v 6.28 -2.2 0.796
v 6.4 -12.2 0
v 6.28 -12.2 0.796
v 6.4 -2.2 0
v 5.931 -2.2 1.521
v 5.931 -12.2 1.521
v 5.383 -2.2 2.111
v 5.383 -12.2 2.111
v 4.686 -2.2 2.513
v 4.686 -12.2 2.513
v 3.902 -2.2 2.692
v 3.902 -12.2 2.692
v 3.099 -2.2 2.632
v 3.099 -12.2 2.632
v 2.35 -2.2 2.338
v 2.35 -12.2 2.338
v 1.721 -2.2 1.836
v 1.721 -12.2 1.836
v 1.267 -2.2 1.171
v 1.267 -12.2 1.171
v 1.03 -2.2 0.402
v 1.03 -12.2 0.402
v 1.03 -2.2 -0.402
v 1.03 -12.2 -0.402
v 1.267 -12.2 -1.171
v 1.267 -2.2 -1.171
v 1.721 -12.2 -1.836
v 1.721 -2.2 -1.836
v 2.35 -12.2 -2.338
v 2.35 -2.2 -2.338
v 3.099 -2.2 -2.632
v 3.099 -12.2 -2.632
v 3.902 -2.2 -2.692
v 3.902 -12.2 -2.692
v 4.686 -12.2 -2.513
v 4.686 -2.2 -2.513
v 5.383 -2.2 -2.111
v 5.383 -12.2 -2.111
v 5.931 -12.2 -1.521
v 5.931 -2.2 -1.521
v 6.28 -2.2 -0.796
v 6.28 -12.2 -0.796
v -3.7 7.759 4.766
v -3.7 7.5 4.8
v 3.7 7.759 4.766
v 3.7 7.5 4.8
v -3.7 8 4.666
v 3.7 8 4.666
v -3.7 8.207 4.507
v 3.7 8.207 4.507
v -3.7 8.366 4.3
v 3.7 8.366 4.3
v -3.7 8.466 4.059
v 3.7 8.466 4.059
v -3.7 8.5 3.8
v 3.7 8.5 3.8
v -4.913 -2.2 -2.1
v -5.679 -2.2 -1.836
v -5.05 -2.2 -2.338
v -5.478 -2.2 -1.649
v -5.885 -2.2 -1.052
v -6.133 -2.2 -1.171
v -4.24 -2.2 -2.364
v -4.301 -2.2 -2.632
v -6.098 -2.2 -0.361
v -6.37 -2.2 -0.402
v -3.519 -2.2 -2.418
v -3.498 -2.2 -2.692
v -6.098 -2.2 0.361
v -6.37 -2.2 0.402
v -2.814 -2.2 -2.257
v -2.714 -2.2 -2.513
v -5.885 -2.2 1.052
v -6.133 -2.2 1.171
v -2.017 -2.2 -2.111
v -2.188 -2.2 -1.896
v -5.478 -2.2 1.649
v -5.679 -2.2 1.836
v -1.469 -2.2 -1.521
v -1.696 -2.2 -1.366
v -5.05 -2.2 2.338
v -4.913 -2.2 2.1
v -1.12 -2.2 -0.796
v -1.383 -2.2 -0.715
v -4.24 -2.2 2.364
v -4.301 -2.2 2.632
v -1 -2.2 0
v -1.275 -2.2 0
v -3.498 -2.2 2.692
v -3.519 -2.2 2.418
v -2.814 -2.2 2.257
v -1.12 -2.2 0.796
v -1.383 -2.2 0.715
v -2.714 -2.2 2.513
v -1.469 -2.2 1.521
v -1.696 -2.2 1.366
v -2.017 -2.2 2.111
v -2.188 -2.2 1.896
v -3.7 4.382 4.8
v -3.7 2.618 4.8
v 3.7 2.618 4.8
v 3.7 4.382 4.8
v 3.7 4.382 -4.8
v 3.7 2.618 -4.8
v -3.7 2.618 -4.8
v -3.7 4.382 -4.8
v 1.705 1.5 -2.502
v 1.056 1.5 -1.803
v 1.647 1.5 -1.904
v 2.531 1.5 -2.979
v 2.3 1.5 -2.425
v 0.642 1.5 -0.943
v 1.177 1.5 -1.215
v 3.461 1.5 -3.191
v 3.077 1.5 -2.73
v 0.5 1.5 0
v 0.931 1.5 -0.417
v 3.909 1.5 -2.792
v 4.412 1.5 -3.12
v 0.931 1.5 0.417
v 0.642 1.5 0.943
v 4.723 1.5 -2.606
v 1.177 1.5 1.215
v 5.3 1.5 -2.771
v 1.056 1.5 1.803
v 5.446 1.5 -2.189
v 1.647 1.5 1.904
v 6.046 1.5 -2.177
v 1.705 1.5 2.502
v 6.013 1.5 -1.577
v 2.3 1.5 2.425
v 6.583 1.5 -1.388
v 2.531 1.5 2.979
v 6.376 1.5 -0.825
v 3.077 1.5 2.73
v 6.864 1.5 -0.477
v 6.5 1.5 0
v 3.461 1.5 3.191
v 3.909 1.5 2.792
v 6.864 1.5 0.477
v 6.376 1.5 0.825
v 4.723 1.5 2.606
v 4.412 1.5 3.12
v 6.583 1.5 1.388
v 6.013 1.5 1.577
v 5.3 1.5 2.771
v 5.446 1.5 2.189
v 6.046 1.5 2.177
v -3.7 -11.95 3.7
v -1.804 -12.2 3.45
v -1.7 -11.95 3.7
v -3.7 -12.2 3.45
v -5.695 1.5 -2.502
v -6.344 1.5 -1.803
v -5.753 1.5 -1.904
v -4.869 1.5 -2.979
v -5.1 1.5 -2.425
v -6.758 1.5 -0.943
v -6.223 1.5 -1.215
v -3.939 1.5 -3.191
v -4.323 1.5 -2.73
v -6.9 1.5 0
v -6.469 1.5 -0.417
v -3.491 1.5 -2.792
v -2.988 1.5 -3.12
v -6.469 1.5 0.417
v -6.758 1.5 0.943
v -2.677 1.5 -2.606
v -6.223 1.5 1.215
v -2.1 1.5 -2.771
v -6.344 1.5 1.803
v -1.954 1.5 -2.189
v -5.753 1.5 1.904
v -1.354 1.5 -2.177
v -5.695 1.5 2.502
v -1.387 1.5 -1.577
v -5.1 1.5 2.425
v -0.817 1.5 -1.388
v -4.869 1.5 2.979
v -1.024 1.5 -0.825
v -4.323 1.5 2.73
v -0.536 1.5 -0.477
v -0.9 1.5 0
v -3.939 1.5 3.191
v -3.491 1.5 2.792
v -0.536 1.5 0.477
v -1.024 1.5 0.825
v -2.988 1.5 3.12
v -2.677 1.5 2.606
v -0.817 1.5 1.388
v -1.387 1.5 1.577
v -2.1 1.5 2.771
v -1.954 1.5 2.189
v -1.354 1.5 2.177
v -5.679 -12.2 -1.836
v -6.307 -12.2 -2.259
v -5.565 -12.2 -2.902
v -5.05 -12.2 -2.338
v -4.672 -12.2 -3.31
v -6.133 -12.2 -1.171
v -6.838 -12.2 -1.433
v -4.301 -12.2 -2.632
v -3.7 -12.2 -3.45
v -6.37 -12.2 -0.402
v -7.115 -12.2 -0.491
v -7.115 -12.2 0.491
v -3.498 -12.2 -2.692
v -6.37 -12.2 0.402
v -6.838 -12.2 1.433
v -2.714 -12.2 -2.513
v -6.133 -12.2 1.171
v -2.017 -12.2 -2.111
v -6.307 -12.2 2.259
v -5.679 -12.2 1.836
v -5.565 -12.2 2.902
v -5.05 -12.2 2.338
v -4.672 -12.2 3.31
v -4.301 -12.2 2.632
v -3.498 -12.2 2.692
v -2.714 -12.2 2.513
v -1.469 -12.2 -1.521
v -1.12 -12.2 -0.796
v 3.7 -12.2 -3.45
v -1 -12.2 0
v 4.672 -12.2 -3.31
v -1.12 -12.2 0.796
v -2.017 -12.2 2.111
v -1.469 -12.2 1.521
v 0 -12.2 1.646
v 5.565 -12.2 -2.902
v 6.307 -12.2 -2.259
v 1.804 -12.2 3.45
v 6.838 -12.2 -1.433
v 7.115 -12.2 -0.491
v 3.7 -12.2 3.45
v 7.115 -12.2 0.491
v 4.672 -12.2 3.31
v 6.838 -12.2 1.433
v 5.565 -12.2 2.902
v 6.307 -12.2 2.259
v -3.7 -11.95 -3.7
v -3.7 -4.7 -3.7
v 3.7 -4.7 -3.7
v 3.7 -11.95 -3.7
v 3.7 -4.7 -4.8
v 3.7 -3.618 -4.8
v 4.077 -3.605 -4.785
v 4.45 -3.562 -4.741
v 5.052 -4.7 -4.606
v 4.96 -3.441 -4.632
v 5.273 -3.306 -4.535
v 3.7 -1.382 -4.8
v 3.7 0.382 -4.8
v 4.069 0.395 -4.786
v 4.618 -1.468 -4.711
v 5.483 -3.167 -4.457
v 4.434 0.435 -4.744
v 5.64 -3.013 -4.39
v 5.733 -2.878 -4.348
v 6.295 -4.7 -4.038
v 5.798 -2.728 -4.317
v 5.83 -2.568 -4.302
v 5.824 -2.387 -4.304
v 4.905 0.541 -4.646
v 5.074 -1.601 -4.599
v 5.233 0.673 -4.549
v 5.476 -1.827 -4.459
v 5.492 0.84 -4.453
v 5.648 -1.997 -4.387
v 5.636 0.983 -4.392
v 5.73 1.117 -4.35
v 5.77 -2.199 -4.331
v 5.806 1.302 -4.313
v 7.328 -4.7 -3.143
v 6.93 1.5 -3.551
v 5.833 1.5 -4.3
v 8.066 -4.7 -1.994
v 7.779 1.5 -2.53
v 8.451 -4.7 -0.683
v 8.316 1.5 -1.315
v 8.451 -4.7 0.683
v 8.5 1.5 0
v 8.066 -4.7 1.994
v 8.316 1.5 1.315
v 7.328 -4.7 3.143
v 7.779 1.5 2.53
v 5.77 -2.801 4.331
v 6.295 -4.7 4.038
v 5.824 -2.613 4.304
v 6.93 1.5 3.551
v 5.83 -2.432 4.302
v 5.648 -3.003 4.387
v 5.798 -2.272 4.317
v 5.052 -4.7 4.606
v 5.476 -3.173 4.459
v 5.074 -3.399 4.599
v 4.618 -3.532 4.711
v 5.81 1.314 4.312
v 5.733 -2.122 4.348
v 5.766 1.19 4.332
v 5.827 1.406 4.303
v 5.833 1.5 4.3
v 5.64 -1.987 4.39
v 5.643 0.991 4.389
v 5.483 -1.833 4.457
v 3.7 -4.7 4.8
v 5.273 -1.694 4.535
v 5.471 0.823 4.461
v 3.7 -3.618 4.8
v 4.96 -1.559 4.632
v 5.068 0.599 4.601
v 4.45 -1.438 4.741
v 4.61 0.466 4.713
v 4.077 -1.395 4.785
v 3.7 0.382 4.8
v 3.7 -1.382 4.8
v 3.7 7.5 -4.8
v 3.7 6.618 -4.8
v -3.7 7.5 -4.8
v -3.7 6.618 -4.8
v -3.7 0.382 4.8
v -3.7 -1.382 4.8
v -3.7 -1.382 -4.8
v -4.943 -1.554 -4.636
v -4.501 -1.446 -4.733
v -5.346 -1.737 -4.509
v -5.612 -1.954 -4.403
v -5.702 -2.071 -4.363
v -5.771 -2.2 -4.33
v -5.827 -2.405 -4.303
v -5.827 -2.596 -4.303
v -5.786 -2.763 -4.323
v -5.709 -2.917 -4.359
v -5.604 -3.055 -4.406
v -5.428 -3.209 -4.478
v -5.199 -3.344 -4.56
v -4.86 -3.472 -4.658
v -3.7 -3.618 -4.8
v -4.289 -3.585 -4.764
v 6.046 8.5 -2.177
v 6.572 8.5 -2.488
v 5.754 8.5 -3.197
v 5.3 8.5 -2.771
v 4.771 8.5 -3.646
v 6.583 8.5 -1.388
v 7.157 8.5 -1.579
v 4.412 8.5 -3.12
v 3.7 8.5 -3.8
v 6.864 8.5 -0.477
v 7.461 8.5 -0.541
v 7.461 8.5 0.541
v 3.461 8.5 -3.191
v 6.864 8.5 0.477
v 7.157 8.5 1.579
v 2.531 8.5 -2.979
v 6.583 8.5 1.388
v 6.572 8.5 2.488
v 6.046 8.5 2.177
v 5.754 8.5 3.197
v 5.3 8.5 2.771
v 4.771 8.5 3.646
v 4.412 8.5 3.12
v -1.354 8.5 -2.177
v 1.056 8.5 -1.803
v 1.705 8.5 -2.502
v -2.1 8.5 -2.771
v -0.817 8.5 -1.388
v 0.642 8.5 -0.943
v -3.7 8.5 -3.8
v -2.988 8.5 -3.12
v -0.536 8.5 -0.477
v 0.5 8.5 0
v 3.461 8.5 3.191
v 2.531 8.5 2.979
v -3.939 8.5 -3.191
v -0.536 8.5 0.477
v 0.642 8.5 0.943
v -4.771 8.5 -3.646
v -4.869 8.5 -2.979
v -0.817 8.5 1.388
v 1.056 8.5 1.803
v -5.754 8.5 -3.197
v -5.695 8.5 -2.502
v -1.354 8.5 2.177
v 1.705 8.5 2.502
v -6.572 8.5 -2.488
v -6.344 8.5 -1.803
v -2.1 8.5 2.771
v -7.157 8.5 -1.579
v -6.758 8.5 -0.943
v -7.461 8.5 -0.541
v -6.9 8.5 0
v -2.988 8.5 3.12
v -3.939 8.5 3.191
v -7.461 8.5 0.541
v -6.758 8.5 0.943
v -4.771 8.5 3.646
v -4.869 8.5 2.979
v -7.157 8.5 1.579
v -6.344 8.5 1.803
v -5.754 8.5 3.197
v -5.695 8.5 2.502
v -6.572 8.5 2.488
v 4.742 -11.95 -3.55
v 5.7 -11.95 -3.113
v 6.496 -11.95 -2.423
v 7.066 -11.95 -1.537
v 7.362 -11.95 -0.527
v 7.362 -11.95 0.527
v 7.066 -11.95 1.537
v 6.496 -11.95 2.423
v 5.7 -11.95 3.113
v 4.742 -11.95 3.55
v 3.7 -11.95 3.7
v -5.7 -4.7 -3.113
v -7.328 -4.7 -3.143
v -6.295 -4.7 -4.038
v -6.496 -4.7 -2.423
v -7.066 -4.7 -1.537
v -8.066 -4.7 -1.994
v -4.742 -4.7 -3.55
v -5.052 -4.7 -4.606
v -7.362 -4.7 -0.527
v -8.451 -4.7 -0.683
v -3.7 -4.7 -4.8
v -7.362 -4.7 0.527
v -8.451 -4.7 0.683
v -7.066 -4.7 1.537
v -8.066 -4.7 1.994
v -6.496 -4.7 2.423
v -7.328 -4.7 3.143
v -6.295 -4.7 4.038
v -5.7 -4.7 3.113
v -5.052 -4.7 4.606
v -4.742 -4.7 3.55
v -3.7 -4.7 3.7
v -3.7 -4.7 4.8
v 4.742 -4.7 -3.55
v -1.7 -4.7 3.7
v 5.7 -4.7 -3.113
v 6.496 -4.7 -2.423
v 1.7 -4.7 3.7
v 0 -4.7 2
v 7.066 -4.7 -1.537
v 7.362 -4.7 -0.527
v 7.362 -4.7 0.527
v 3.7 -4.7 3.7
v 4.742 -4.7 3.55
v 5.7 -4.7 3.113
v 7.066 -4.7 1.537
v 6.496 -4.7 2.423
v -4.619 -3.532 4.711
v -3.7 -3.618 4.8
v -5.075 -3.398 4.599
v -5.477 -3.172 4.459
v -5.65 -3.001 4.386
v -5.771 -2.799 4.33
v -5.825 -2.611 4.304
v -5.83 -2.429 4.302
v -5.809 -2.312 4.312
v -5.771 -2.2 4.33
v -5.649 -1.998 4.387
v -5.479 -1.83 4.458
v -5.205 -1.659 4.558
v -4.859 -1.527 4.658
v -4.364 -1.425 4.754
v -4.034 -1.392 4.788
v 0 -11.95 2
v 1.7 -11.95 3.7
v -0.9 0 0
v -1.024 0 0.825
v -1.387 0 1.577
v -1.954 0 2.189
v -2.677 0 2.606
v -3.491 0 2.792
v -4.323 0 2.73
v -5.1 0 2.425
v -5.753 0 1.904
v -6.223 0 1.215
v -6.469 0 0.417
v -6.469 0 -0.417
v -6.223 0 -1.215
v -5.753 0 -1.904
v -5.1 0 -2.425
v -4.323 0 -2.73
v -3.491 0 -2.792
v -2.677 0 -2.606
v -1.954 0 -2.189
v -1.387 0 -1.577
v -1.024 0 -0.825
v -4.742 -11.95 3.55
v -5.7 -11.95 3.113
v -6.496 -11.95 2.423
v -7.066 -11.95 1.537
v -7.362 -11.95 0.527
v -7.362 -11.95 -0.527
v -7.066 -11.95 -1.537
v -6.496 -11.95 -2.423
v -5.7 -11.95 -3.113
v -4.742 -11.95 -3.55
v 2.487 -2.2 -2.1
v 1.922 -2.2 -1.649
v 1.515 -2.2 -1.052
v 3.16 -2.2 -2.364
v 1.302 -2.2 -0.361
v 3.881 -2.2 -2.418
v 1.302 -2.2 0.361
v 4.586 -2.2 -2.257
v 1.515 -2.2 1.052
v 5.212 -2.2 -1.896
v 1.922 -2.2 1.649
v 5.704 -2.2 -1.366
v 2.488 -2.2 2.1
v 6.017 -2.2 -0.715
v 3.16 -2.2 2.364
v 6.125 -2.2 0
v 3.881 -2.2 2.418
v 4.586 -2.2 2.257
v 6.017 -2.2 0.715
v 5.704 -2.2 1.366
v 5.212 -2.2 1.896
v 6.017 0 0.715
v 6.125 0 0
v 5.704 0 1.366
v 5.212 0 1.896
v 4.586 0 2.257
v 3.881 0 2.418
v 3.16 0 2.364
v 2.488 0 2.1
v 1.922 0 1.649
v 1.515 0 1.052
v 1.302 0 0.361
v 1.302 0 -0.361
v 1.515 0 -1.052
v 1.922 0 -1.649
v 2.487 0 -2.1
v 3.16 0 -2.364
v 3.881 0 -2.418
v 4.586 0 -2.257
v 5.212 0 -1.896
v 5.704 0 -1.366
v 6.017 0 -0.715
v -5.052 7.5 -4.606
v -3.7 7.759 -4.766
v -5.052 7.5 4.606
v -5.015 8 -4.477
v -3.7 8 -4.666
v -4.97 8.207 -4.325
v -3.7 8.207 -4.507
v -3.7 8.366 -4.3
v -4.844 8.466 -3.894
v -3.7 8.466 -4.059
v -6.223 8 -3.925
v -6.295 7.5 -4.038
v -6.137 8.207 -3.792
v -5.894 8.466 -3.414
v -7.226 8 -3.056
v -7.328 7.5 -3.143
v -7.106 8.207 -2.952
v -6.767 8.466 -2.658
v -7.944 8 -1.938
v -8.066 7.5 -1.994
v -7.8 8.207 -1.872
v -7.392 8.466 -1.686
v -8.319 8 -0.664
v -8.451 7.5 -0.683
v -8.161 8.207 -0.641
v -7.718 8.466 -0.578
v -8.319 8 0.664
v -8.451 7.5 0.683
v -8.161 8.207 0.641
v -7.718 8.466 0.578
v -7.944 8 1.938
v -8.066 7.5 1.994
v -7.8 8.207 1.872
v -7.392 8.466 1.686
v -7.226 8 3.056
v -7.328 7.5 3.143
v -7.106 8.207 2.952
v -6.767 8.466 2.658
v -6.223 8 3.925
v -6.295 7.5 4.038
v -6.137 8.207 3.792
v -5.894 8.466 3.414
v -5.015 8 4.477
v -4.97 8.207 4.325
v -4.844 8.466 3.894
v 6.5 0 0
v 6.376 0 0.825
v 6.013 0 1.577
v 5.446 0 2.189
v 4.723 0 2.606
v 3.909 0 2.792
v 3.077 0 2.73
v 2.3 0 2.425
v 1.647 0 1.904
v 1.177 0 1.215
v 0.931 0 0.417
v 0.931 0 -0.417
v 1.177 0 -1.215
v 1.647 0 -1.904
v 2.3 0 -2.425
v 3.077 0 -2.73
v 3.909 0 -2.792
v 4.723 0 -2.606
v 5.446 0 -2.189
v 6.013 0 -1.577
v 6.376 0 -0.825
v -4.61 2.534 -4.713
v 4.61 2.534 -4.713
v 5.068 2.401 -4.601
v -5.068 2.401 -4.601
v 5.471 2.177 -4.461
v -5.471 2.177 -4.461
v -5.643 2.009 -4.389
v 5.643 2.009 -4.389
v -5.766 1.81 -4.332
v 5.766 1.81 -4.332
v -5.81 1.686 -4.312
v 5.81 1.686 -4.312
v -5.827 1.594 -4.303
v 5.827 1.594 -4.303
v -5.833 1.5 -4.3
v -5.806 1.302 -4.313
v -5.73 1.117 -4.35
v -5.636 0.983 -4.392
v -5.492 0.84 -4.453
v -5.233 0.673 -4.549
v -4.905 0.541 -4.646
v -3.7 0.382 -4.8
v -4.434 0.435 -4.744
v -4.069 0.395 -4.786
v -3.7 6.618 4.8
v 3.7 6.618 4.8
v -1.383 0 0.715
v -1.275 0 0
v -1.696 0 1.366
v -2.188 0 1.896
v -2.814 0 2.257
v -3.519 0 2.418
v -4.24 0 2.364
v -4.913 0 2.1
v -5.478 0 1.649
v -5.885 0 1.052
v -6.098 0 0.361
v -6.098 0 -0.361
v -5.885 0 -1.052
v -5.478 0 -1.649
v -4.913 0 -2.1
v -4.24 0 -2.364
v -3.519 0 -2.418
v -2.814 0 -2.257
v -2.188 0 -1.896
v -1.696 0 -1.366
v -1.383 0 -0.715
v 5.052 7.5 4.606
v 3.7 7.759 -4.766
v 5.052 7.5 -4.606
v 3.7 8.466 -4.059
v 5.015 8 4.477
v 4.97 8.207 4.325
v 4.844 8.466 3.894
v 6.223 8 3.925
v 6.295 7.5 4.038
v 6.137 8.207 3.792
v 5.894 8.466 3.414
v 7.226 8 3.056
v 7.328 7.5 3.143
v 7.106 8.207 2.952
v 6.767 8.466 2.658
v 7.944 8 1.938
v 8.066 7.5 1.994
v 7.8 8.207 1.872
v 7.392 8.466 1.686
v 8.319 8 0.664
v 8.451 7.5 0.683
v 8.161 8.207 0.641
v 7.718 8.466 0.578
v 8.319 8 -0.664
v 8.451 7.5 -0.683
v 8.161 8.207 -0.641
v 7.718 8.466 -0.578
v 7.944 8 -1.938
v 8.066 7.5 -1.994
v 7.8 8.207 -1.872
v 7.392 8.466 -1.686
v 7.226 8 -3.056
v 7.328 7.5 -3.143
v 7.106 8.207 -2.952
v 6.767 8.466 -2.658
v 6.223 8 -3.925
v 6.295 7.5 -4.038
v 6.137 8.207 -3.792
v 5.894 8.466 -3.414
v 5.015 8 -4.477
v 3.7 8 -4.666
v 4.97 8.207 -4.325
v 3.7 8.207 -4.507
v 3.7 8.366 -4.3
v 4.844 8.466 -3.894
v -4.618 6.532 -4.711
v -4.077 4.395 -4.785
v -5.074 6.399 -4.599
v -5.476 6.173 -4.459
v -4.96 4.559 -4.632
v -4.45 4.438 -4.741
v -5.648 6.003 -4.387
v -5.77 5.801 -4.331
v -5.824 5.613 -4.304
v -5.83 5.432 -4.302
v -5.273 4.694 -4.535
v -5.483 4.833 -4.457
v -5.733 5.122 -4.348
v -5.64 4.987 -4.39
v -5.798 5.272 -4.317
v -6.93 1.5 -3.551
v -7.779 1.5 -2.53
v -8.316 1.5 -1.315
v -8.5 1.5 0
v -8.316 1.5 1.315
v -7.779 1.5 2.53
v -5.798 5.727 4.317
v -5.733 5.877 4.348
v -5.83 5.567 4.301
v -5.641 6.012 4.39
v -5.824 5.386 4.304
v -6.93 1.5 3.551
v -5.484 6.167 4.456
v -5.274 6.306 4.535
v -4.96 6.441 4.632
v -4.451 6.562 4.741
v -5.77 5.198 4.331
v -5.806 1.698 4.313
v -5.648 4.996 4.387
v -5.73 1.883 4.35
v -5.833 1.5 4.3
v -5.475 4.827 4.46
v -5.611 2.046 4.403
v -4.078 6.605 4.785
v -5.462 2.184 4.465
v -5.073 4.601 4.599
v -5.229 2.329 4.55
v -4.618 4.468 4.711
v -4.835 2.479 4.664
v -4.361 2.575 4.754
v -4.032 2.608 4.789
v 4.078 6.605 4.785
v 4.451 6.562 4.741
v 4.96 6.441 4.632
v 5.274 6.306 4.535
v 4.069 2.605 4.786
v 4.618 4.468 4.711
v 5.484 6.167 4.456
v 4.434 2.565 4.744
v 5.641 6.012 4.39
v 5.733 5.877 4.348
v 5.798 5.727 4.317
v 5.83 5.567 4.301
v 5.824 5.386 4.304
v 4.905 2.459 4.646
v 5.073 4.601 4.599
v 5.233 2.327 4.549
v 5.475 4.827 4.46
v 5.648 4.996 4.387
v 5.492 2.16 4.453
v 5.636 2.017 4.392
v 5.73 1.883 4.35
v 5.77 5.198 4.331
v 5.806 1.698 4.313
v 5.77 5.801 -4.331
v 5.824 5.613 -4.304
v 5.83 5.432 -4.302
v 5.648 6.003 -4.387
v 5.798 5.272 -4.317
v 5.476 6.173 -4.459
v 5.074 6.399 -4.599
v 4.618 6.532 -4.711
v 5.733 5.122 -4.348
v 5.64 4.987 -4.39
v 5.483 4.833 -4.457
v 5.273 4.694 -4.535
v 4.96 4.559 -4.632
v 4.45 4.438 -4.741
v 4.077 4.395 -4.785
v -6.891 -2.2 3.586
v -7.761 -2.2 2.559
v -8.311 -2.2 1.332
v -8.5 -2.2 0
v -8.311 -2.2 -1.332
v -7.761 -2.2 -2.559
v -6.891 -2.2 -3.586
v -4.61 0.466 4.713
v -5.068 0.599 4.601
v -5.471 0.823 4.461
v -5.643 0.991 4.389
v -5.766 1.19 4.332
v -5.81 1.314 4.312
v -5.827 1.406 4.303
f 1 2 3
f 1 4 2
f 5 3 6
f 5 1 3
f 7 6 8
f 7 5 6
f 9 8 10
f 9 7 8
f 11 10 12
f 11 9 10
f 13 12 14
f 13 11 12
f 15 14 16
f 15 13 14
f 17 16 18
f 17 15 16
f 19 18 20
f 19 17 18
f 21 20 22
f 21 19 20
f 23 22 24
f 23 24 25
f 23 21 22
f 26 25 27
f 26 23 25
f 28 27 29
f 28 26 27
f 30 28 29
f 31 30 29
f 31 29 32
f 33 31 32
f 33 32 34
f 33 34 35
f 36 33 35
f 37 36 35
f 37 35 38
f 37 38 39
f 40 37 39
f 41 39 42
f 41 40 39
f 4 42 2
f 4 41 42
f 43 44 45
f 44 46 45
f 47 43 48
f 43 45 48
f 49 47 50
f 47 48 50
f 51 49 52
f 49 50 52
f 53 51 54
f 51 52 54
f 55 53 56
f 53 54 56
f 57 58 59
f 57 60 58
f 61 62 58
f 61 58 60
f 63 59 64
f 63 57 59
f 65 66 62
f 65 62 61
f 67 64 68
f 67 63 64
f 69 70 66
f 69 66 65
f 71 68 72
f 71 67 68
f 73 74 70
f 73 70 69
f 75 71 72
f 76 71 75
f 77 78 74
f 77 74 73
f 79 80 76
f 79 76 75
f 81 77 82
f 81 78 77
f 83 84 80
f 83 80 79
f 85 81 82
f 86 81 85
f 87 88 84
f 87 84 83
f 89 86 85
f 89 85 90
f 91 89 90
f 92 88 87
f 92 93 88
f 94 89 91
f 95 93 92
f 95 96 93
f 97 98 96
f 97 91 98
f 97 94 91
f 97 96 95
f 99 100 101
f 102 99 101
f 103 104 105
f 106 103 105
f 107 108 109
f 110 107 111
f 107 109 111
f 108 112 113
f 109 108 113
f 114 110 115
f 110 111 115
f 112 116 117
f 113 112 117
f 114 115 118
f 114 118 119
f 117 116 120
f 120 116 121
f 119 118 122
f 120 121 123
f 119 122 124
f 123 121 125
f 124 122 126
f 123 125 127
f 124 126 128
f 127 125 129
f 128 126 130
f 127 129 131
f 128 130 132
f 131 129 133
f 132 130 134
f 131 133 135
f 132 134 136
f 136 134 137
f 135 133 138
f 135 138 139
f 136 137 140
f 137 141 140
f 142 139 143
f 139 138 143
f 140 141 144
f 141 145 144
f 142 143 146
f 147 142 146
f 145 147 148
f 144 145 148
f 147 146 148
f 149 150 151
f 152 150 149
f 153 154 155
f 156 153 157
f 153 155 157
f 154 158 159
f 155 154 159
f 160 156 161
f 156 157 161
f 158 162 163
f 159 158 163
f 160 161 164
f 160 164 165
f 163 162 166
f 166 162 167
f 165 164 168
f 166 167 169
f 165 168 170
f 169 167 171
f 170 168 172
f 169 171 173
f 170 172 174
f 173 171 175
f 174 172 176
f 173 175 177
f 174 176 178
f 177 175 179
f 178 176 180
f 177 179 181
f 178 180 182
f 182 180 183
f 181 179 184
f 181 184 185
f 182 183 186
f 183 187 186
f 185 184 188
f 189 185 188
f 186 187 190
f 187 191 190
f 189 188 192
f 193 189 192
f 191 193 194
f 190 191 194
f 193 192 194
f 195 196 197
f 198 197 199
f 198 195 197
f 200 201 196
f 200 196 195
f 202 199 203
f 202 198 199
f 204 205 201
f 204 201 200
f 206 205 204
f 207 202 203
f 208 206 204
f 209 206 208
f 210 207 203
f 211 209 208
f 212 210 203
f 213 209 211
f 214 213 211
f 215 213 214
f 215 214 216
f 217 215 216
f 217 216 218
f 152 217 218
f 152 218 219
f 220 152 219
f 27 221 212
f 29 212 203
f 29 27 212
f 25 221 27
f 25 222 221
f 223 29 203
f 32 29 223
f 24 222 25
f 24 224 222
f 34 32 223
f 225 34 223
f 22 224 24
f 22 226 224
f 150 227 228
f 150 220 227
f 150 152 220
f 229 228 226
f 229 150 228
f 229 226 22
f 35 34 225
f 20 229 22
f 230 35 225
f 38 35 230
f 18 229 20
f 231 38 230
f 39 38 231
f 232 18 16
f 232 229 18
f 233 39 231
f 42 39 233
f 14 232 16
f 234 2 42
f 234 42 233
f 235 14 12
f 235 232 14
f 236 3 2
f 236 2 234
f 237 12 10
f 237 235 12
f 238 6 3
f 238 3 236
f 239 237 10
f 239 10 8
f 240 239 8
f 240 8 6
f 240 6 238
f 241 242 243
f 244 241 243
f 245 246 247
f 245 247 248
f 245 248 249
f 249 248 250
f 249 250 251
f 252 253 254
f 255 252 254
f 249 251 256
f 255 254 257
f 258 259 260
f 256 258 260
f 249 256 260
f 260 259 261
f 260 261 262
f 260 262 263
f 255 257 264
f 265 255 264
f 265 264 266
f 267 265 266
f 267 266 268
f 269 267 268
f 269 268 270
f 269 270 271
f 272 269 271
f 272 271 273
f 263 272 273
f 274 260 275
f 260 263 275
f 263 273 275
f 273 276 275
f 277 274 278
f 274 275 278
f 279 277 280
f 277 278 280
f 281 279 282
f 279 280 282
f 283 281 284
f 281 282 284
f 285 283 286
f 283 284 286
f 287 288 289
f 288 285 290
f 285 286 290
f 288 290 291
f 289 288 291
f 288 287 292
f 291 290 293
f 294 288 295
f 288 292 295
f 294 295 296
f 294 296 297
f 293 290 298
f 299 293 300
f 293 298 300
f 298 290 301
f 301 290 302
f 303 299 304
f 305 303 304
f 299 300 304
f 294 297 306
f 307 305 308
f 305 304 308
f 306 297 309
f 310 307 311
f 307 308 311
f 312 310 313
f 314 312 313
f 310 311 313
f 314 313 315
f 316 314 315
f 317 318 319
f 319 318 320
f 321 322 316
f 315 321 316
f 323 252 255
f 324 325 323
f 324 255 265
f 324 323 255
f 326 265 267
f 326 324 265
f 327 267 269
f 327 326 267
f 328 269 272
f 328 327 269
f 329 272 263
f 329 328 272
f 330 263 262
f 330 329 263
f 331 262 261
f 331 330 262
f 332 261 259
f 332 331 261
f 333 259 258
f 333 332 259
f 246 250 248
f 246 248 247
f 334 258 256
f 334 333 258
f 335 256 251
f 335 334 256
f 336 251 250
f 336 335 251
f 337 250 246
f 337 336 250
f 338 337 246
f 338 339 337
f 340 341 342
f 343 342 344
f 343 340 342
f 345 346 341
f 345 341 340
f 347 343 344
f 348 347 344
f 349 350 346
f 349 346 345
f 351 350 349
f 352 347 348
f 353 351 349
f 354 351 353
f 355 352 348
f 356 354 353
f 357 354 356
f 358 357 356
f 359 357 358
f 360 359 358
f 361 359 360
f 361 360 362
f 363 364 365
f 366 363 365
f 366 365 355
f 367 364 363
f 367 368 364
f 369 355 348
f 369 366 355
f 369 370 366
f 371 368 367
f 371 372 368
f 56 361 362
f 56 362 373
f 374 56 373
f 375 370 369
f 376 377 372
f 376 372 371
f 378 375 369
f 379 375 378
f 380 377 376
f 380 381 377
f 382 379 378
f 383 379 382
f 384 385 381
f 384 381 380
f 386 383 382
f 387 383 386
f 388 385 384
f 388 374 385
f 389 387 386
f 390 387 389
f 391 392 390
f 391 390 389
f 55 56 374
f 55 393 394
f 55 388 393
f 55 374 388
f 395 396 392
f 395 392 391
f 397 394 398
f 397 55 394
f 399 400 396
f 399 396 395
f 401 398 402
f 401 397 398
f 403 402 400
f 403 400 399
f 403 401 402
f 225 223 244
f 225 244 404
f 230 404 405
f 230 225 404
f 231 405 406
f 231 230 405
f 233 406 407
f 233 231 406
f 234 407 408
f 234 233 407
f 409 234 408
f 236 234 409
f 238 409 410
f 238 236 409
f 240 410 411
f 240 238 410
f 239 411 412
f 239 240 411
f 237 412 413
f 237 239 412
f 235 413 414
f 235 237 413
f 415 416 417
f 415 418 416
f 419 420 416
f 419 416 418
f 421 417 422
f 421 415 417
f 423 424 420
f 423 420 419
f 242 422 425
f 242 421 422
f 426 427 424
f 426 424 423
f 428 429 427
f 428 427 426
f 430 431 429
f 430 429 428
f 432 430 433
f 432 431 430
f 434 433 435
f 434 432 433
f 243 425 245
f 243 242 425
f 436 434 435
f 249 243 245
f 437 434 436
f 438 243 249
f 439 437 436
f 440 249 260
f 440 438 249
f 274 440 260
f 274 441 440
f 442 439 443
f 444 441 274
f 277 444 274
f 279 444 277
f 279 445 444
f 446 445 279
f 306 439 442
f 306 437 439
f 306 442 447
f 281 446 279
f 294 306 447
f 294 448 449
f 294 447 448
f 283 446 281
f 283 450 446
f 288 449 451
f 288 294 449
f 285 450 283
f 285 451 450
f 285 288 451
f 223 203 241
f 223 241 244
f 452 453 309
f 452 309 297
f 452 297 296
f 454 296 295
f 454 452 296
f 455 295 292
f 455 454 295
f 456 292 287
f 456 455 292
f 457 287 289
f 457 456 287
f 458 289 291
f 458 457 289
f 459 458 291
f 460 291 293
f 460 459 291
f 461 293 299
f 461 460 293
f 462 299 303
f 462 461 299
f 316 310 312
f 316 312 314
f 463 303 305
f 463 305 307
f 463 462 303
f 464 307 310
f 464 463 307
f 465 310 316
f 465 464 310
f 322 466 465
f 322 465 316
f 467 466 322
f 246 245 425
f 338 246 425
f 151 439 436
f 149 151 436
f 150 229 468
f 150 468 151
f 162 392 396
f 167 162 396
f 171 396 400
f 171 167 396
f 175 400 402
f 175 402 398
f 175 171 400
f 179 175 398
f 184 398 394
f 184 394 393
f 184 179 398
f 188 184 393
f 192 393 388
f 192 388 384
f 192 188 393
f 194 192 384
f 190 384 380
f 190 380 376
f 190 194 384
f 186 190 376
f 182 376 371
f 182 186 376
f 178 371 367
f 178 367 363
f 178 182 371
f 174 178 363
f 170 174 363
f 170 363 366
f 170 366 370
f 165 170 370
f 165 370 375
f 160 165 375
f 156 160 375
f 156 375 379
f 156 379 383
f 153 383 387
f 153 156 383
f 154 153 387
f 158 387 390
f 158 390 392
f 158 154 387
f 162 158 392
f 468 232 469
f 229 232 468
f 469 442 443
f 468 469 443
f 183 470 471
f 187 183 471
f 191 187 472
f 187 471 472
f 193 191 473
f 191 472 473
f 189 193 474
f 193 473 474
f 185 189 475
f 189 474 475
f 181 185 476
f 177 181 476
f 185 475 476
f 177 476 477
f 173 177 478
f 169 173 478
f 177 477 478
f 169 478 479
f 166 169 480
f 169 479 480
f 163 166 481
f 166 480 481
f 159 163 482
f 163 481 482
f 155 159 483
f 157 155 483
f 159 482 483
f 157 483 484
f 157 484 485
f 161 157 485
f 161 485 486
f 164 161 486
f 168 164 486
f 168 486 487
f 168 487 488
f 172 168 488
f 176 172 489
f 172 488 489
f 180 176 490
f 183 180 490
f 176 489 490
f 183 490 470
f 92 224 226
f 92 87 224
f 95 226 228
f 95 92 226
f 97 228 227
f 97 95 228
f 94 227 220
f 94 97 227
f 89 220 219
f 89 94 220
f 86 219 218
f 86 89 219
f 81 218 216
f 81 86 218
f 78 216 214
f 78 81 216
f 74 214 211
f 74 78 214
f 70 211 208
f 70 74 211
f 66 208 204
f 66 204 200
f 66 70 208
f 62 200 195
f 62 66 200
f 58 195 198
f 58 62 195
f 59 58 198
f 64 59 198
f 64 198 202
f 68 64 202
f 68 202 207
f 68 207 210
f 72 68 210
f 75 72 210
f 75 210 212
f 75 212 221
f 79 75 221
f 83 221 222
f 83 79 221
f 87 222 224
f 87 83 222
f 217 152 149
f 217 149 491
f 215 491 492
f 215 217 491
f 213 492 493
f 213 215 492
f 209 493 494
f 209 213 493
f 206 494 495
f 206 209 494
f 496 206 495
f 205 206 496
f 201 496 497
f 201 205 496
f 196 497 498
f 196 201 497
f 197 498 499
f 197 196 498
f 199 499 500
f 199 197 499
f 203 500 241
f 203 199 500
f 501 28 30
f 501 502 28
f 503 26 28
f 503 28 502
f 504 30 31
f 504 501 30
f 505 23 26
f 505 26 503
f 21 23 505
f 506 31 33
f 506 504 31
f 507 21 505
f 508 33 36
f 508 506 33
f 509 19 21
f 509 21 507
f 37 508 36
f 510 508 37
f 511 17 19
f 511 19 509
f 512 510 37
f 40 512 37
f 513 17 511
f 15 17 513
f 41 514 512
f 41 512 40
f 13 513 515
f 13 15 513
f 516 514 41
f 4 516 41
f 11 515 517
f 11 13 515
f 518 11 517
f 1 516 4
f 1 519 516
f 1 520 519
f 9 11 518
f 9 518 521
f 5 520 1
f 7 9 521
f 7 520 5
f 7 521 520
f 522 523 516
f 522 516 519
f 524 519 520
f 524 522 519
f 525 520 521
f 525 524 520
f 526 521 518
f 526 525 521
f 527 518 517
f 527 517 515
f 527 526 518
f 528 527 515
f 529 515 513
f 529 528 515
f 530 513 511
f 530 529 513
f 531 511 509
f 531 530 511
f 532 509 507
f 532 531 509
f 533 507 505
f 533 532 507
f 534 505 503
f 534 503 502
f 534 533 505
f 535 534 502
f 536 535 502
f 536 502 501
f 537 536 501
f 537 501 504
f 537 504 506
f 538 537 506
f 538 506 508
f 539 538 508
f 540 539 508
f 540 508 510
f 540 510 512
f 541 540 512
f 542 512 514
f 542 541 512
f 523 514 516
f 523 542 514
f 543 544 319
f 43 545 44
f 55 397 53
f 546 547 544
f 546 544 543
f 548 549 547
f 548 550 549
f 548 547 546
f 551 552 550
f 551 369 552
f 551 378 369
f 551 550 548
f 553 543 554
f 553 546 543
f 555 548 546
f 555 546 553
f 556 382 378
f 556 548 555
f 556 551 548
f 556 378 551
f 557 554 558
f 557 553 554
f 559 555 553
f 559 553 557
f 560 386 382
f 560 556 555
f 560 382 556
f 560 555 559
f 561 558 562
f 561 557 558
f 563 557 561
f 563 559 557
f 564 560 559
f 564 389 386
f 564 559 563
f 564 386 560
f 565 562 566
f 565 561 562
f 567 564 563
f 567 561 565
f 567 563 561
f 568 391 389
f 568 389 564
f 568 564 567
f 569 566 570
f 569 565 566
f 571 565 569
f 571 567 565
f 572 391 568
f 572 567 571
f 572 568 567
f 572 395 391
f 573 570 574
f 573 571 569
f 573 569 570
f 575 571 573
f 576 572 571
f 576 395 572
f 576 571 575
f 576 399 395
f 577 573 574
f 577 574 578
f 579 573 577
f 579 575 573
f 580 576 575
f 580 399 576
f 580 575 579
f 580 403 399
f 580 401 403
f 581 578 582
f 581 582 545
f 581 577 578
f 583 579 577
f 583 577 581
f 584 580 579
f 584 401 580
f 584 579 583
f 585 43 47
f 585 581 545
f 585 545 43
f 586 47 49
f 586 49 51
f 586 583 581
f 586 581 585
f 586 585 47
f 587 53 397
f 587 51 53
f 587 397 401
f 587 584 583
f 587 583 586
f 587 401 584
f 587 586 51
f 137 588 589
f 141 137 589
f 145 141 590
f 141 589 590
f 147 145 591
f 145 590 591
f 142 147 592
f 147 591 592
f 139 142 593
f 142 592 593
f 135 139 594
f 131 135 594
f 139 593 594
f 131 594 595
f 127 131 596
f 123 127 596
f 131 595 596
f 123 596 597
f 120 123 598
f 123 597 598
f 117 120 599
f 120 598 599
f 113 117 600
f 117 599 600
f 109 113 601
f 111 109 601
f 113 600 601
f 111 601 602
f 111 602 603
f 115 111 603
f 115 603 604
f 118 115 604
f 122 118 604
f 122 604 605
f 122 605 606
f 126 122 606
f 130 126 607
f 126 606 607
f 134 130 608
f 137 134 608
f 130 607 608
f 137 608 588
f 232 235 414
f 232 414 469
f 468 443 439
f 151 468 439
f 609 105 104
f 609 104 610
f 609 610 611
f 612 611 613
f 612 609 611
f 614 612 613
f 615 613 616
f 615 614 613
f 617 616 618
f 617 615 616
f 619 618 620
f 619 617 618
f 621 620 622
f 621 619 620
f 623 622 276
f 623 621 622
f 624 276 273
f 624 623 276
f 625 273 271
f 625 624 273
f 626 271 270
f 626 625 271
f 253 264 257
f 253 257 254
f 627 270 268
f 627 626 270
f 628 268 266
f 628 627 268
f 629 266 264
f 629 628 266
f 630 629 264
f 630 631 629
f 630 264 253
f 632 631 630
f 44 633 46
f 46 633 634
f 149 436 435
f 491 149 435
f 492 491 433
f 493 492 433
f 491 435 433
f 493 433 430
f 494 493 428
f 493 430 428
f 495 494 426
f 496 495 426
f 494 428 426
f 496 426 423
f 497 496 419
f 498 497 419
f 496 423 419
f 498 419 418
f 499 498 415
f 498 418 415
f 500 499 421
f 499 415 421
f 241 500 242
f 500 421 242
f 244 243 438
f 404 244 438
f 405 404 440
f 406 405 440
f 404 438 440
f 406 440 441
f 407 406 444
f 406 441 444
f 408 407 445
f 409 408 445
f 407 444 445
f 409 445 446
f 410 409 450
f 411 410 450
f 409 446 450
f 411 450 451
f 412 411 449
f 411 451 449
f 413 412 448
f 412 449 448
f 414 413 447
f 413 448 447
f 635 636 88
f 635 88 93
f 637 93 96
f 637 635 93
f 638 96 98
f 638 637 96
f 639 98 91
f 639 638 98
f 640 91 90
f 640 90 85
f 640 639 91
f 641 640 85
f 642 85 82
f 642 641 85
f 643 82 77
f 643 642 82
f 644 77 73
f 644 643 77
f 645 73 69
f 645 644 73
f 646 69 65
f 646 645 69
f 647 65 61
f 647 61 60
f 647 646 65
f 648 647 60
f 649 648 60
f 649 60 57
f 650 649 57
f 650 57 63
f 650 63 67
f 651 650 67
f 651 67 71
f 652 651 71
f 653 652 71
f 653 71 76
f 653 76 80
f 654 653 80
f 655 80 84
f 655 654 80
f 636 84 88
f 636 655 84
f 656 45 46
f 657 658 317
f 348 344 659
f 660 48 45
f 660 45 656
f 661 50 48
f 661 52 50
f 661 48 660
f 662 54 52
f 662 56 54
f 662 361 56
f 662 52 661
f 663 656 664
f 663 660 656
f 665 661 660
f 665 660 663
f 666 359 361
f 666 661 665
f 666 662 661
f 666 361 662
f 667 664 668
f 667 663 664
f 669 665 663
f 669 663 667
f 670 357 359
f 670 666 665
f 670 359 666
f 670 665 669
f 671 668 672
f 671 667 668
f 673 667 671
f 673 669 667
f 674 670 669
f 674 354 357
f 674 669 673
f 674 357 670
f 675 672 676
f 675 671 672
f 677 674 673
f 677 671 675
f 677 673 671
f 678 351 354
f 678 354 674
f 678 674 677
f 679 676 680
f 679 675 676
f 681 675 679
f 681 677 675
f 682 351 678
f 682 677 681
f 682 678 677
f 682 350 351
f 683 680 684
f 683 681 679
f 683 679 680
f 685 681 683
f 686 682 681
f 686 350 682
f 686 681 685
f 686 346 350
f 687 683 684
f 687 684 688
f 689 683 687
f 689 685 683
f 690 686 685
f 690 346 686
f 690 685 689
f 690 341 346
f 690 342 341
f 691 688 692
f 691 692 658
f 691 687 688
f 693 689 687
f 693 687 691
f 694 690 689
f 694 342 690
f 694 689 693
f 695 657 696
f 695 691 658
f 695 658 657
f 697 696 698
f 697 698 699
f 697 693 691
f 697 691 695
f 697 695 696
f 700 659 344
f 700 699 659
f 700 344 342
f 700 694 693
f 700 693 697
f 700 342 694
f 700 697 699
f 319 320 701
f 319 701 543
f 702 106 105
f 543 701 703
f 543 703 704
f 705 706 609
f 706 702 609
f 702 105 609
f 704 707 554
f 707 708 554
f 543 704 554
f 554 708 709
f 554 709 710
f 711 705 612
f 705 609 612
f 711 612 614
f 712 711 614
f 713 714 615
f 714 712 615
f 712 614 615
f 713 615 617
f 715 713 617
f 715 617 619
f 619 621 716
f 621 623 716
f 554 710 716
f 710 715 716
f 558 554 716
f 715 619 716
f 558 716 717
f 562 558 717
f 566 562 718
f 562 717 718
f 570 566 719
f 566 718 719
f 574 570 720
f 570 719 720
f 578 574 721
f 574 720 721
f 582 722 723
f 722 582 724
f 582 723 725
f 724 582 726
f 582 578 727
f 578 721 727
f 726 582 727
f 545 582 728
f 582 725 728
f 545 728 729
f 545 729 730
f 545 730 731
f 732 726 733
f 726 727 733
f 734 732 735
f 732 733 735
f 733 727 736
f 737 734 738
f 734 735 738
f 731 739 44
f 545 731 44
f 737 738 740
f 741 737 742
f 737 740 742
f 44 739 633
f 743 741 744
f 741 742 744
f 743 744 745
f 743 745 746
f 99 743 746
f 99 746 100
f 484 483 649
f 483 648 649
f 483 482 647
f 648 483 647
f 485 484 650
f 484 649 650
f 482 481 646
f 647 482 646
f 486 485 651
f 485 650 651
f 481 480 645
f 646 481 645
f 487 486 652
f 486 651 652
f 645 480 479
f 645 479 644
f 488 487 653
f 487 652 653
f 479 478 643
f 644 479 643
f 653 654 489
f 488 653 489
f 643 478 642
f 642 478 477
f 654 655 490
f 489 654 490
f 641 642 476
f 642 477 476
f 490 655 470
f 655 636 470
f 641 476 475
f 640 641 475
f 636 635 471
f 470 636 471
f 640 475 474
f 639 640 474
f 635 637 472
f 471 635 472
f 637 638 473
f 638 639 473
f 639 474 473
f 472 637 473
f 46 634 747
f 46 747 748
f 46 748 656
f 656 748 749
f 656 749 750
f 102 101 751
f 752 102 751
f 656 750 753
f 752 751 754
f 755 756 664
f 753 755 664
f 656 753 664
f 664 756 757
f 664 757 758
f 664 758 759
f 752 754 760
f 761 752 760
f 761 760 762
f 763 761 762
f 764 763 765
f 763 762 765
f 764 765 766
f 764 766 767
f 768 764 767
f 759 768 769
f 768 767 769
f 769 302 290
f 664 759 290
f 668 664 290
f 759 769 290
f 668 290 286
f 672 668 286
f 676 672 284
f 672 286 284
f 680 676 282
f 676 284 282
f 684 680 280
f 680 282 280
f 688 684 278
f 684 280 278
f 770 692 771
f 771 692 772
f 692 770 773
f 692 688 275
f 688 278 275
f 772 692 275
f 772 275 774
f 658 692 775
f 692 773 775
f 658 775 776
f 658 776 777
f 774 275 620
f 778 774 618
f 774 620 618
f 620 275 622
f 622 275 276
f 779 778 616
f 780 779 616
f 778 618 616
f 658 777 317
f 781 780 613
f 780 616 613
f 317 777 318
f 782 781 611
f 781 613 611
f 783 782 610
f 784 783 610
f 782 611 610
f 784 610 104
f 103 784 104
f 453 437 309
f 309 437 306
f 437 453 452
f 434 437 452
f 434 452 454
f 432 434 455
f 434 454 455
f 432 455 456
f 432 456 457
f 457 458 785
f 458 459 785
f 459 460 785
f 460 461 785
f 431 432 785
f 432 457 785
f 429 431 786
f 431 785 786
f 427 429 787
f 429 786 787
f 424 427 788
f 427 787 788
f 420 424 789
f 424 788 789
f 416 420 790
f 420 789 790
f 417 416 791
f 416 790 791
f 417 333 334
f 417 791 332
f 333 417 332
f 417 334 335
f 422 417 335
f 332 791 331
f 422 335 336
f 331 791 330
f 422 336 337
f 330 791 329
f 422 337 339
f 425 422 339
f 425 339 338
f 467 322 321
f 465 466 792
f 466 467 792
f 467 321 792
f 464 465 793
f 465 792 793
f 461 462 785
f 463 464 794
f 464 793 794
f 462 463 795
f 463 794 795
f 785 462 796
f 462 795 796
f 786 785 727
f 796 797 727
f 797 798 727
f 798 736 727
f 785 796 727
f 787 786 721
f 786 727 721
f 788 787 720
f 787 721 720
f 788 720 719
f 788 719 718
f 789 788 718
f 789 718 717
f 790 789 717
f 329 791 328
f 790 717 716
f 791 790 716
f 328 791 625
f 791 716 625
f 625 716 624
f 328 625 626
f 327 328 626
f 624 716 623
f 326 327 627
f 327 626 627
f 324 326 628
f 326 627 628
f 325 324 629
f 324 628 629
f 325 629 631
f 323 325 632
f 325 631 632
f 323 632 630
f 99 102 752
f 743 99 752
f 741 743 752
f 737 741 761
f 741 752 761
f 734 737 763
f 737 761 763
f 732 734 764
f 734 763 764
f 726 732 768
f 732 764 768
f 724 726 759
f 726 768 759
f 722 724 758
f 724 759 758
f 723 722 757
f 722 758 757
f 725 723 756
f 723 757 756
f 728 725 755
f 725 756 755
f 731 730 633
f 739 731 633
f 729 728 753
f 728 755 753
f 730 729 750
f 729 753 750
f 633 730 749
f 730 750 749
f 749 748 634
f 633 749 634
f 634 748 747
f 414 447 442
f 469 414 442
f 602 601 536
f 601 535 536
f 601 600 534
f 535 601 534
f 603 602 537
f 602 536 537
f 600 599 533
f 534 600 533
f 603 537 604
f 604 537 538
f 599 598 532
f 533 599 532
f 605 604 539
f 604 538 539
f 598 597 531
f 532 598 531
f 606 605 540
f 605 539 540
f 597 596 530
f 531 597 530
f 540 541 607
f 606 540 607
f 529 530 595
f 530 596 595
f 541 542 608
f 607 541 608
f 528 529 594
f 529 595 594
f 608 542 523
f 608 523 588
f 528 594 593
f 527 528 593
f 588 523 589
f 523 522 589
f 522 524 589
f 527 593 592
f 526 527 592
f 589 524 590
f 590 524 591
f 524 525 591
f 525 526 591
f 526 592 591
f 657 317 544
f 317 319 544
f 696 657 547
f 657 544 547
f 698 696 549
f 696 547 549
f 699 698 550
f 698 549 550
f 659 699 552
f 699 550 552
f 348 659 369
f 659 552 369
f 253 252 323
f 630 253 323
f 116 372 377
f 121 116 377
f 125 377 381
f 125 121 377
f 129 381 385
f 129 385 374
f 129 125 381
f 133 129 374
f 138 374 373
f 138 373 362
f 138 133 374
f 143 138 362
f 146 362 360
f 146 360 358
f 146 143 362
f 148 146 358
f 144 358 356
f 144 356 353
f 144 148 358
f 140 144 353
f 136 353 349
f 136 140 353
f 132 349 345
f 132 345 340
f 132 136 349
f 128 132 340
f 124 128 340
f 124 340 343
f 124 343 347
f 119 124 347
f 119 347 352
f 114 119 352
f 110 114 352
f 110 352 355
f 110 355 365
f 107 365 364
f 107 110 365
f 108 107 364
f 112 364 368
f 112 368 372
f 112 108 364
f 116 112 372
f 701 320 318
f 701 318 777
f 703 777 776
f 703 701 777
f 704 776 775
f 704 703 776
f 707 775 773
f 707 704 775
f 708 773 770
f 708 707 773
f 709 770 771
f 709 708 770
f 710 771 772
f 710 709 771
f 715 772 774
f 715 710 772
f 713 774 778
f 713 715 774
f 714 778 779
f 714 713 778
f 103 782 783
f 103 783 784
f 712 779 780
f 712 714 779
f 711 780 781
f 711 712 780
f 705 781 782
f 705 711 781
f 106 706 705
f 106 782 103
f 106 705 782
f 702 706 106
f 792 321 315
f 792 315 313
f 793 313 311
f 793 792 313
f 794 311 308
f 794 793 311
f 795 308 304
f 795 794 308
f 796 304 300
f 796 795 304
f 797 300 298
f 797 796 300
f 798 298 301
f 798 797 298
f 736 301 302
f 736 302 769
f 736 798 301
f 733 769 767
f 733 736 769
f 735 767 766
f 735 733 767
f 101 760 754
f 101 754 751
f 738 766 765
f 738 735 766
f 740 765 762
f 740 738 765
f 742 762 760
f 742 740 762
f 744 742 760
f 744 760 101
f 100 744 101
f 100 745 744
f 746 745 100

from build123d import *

# Parameters (mm, degrees)
F0_R      = 2.8
F1_DEPTH  = 1.5
F0_R_2    = 2.425
F2_DEPTH  = 2.2
F3_R      = 2.7
F4_DEPTH  = 2.5
F5_R      = 2.7
F6_DEPTH  = 7.5
F7_R      = 3.2
F8_DEPTH  = 7
F9_R      = 1
F10_SIZE  = 0.25
F11_R     = 1.5
F12_DEPTH = 8.5


# Not quite as in the source:
# - a feature names something its author has since deleted; it is built from what else it names


with BuildPart() as f1:
    # F0 (on Front) → F1 (new body)
    with BuildSketch(Plane.XZ):
        with BuildLine():
            Line((0, 4.8), (-3.7, 4.8))
            ThreePointArc((-3.7, 4.8), (-7.0941125497, 3.3941125497), (-8.5, 0))
            ThreePointArc((-8.5, 0), (-7.0941125497, -3.3941125497), (-3.7, -4.8))
            Line((-3.7, -4.8), (0, -4.8))
            Line((0, -4.8), (3.7, -4.8))
            ThreePointArc((3.7, -4.8), (7.0941125497, -3.3941125497), (8.5, 0))
            ThreePointArc((8.5, 0), (7.0941125497, 3.3941125497), (3.7, 4.8))
            Line((3.7, 4.8), (0, 4.8))
        make_face()
        with Locations((-3.7, 0)):
            Circle(F0_R, mode=Mode.SUBTRACT)
        with Locations((3.7, 0)):
            Circle(F0_R, mode=Mode.SUBTRACT)
    extrude(amount=-F1_DEPTH)

    # F0 (on Front) → F2 (join)
    with BuildSketch(Plane.XZ):
        with BuildLine():
            Line((0, 4.8), (-3.7, 4.8))
            ThreePointArc((-3.7, 4.8), (-7.0941125497, 3.3941125497), (-8.5, 0))
            ThreePointArc((-8.5, 0), (-7.0941125497, -3.3941125497), (-3.7, -4.8))
            Line((-3.7, -4.8), (0, -4.8))
            Line((0, -4.8), (3.7, -4.8))
            ThreePointArc((3.7, -4.8), (7.0941125497, -3.3941125497), (8.5, 0))
            ThreePointArc((8.5, 0), (7.0941125497, 3.3941125497), (3.7, 4.8))
            Line((3.7, 4.8), (0, 4.8))
        make_face()
        with Locations((-3.7, 0)):
            Circle(F0_R, mode=Mode.SUBTRACT)
        with Locations((3.7, 0)):
            Circle(F0_R, mode=Mode.SUBTRACT)
        with Locations((-3.7, 0)):
            Circle(F0_R)
        with Locations((-3.7, 0)):
            Circle(F0_R_2, mode=Mode.SUBTRACT)
        with Locations((3.7, 0)):
            Circle(F0_R)
        with Locations((3.7, 0)):
            Circle(F0_R_2, mode=Mode.SUBTRACT)
    extrude(amount=F2_DEPTH)

    # F3 (on face) → F4 (join)
    with BuildSketch(Plane.XZ.offset(2.2)):
        with BuildLine():
            ThreePointArc((3.7, -4.8), (8.5, 0), (3.7, 4.8))
            Line((3.7, 4.8), (-3.7, 4.8))
            ThreePointArc((-3.7, 4.8), (-8.5, 0), (-3.7, -4.8))
            Line((-3.7, -4.8), (3.7, -4.8))
        make_face()
        with Locations((-3.7, 0)):
            Circle(F3_R, mode=Mode.SUBTRACT)
        with Locations((3.7, 0)):
            Circle(F3_R, mode=Mode.SUBTRACT)
    extrude(amount=F4_DEPTH)

    # F5 (on face) → F6 (join)
    with BuildSketch(Plane.XZ.offset(4.7)):
        with BuildLine():
            ThreePointArc((-3.7, 3.7), (-7.4, 0), (-3.7, -3.7))
            Line((-3.7, -3.7), (0, -3.7))
            Line((0, -3.7), (3.7, -3.7))
            ThreePointArc((3.7, -3.7), (7.4, 0), (3.7, 3.7))
            Line((3.7, 3.7), (1.7, 3.7))
            Line((1.7, 3.7), (0, 2))
            Line((0, 2), (-1.7, 3.7))
            Line((-1.7, 3.7), (-3.7, 3.7))
        make_face()
        with Locations((-3.7, 0)):
            Circle(F5_R, mode=Mode.SUBTRACT)
        with Locations((3.7, 0)):
            Circle(F5_R, mode=Mode.SUBTRACT)
    extrude(amount=F6_DEPTH)

    # F7 (on face) → F8 (join)
    with BuildSketch(Plane(origin=(0, 1.5, 0), x_dir=(-1, 0, 0), z_dir=(0, 1, 0))):
        with BuildLine():
            ThreePointArc((3.7, -4.8), (8.5, 0), (3.7, 4.8))
            Line((3.7, 4.8), (-3.7, 4.8))
            ThreePointArc((-3.7, 4.8), (-8.5, 0), (-3.7, -4.8))
            Line((-3.7, -4.8), (3.7, -4.8))
        make_face()
        with Locations((-3.7, 0)):
            Circle(F7_R, mode=Mode.SUBTRACT)
        with Locations((3.7, 0)):
            Circle(F7_R, mode=Mode.SUBTRACT)
    extrude(amount=F8_DEPTH)

    # F9
    f9_edges = [f1.edges().sort_by_distance(p)[0] for p in [
        (0, 8.5, 4.8),
    ]]
    fillet(f9_edges, radius=F9_R)

    # F10
    f10_edges = [f1.edges().sort_by_distance(p)[0] for p in [
        (-2.7, -12.2, 3.7),
        (-0.85, -12.2, 2.85),
        (0.85, -12.2, 2.85),
    ]]
    chamfer(f10_edges, length=F10_SIZE)

    # F11 (on Right) → F12 (cut, symmetric)
    with BuildSketch(Plane.YZ):
        with Locations((1.5, 5.8)):
            Circle(F11_R)
        with Locations((-2.5, 5.8)):
            Circle(F11_R)
        with Locations((-2.5, -5.8)):
            Circle(F11_R)
        with Locations((1.5, -5.8)):
            Circle(F11_R)
        with Locations((5.5, -5.8)):
            Circle(F11_R)
        with Locations((5.5, 5.8)):
            Circle(F11_R)
    extrude(amount=F12_DEPTH, both=True, mode=Mode.SUBTRACT)


solid = f1.part
